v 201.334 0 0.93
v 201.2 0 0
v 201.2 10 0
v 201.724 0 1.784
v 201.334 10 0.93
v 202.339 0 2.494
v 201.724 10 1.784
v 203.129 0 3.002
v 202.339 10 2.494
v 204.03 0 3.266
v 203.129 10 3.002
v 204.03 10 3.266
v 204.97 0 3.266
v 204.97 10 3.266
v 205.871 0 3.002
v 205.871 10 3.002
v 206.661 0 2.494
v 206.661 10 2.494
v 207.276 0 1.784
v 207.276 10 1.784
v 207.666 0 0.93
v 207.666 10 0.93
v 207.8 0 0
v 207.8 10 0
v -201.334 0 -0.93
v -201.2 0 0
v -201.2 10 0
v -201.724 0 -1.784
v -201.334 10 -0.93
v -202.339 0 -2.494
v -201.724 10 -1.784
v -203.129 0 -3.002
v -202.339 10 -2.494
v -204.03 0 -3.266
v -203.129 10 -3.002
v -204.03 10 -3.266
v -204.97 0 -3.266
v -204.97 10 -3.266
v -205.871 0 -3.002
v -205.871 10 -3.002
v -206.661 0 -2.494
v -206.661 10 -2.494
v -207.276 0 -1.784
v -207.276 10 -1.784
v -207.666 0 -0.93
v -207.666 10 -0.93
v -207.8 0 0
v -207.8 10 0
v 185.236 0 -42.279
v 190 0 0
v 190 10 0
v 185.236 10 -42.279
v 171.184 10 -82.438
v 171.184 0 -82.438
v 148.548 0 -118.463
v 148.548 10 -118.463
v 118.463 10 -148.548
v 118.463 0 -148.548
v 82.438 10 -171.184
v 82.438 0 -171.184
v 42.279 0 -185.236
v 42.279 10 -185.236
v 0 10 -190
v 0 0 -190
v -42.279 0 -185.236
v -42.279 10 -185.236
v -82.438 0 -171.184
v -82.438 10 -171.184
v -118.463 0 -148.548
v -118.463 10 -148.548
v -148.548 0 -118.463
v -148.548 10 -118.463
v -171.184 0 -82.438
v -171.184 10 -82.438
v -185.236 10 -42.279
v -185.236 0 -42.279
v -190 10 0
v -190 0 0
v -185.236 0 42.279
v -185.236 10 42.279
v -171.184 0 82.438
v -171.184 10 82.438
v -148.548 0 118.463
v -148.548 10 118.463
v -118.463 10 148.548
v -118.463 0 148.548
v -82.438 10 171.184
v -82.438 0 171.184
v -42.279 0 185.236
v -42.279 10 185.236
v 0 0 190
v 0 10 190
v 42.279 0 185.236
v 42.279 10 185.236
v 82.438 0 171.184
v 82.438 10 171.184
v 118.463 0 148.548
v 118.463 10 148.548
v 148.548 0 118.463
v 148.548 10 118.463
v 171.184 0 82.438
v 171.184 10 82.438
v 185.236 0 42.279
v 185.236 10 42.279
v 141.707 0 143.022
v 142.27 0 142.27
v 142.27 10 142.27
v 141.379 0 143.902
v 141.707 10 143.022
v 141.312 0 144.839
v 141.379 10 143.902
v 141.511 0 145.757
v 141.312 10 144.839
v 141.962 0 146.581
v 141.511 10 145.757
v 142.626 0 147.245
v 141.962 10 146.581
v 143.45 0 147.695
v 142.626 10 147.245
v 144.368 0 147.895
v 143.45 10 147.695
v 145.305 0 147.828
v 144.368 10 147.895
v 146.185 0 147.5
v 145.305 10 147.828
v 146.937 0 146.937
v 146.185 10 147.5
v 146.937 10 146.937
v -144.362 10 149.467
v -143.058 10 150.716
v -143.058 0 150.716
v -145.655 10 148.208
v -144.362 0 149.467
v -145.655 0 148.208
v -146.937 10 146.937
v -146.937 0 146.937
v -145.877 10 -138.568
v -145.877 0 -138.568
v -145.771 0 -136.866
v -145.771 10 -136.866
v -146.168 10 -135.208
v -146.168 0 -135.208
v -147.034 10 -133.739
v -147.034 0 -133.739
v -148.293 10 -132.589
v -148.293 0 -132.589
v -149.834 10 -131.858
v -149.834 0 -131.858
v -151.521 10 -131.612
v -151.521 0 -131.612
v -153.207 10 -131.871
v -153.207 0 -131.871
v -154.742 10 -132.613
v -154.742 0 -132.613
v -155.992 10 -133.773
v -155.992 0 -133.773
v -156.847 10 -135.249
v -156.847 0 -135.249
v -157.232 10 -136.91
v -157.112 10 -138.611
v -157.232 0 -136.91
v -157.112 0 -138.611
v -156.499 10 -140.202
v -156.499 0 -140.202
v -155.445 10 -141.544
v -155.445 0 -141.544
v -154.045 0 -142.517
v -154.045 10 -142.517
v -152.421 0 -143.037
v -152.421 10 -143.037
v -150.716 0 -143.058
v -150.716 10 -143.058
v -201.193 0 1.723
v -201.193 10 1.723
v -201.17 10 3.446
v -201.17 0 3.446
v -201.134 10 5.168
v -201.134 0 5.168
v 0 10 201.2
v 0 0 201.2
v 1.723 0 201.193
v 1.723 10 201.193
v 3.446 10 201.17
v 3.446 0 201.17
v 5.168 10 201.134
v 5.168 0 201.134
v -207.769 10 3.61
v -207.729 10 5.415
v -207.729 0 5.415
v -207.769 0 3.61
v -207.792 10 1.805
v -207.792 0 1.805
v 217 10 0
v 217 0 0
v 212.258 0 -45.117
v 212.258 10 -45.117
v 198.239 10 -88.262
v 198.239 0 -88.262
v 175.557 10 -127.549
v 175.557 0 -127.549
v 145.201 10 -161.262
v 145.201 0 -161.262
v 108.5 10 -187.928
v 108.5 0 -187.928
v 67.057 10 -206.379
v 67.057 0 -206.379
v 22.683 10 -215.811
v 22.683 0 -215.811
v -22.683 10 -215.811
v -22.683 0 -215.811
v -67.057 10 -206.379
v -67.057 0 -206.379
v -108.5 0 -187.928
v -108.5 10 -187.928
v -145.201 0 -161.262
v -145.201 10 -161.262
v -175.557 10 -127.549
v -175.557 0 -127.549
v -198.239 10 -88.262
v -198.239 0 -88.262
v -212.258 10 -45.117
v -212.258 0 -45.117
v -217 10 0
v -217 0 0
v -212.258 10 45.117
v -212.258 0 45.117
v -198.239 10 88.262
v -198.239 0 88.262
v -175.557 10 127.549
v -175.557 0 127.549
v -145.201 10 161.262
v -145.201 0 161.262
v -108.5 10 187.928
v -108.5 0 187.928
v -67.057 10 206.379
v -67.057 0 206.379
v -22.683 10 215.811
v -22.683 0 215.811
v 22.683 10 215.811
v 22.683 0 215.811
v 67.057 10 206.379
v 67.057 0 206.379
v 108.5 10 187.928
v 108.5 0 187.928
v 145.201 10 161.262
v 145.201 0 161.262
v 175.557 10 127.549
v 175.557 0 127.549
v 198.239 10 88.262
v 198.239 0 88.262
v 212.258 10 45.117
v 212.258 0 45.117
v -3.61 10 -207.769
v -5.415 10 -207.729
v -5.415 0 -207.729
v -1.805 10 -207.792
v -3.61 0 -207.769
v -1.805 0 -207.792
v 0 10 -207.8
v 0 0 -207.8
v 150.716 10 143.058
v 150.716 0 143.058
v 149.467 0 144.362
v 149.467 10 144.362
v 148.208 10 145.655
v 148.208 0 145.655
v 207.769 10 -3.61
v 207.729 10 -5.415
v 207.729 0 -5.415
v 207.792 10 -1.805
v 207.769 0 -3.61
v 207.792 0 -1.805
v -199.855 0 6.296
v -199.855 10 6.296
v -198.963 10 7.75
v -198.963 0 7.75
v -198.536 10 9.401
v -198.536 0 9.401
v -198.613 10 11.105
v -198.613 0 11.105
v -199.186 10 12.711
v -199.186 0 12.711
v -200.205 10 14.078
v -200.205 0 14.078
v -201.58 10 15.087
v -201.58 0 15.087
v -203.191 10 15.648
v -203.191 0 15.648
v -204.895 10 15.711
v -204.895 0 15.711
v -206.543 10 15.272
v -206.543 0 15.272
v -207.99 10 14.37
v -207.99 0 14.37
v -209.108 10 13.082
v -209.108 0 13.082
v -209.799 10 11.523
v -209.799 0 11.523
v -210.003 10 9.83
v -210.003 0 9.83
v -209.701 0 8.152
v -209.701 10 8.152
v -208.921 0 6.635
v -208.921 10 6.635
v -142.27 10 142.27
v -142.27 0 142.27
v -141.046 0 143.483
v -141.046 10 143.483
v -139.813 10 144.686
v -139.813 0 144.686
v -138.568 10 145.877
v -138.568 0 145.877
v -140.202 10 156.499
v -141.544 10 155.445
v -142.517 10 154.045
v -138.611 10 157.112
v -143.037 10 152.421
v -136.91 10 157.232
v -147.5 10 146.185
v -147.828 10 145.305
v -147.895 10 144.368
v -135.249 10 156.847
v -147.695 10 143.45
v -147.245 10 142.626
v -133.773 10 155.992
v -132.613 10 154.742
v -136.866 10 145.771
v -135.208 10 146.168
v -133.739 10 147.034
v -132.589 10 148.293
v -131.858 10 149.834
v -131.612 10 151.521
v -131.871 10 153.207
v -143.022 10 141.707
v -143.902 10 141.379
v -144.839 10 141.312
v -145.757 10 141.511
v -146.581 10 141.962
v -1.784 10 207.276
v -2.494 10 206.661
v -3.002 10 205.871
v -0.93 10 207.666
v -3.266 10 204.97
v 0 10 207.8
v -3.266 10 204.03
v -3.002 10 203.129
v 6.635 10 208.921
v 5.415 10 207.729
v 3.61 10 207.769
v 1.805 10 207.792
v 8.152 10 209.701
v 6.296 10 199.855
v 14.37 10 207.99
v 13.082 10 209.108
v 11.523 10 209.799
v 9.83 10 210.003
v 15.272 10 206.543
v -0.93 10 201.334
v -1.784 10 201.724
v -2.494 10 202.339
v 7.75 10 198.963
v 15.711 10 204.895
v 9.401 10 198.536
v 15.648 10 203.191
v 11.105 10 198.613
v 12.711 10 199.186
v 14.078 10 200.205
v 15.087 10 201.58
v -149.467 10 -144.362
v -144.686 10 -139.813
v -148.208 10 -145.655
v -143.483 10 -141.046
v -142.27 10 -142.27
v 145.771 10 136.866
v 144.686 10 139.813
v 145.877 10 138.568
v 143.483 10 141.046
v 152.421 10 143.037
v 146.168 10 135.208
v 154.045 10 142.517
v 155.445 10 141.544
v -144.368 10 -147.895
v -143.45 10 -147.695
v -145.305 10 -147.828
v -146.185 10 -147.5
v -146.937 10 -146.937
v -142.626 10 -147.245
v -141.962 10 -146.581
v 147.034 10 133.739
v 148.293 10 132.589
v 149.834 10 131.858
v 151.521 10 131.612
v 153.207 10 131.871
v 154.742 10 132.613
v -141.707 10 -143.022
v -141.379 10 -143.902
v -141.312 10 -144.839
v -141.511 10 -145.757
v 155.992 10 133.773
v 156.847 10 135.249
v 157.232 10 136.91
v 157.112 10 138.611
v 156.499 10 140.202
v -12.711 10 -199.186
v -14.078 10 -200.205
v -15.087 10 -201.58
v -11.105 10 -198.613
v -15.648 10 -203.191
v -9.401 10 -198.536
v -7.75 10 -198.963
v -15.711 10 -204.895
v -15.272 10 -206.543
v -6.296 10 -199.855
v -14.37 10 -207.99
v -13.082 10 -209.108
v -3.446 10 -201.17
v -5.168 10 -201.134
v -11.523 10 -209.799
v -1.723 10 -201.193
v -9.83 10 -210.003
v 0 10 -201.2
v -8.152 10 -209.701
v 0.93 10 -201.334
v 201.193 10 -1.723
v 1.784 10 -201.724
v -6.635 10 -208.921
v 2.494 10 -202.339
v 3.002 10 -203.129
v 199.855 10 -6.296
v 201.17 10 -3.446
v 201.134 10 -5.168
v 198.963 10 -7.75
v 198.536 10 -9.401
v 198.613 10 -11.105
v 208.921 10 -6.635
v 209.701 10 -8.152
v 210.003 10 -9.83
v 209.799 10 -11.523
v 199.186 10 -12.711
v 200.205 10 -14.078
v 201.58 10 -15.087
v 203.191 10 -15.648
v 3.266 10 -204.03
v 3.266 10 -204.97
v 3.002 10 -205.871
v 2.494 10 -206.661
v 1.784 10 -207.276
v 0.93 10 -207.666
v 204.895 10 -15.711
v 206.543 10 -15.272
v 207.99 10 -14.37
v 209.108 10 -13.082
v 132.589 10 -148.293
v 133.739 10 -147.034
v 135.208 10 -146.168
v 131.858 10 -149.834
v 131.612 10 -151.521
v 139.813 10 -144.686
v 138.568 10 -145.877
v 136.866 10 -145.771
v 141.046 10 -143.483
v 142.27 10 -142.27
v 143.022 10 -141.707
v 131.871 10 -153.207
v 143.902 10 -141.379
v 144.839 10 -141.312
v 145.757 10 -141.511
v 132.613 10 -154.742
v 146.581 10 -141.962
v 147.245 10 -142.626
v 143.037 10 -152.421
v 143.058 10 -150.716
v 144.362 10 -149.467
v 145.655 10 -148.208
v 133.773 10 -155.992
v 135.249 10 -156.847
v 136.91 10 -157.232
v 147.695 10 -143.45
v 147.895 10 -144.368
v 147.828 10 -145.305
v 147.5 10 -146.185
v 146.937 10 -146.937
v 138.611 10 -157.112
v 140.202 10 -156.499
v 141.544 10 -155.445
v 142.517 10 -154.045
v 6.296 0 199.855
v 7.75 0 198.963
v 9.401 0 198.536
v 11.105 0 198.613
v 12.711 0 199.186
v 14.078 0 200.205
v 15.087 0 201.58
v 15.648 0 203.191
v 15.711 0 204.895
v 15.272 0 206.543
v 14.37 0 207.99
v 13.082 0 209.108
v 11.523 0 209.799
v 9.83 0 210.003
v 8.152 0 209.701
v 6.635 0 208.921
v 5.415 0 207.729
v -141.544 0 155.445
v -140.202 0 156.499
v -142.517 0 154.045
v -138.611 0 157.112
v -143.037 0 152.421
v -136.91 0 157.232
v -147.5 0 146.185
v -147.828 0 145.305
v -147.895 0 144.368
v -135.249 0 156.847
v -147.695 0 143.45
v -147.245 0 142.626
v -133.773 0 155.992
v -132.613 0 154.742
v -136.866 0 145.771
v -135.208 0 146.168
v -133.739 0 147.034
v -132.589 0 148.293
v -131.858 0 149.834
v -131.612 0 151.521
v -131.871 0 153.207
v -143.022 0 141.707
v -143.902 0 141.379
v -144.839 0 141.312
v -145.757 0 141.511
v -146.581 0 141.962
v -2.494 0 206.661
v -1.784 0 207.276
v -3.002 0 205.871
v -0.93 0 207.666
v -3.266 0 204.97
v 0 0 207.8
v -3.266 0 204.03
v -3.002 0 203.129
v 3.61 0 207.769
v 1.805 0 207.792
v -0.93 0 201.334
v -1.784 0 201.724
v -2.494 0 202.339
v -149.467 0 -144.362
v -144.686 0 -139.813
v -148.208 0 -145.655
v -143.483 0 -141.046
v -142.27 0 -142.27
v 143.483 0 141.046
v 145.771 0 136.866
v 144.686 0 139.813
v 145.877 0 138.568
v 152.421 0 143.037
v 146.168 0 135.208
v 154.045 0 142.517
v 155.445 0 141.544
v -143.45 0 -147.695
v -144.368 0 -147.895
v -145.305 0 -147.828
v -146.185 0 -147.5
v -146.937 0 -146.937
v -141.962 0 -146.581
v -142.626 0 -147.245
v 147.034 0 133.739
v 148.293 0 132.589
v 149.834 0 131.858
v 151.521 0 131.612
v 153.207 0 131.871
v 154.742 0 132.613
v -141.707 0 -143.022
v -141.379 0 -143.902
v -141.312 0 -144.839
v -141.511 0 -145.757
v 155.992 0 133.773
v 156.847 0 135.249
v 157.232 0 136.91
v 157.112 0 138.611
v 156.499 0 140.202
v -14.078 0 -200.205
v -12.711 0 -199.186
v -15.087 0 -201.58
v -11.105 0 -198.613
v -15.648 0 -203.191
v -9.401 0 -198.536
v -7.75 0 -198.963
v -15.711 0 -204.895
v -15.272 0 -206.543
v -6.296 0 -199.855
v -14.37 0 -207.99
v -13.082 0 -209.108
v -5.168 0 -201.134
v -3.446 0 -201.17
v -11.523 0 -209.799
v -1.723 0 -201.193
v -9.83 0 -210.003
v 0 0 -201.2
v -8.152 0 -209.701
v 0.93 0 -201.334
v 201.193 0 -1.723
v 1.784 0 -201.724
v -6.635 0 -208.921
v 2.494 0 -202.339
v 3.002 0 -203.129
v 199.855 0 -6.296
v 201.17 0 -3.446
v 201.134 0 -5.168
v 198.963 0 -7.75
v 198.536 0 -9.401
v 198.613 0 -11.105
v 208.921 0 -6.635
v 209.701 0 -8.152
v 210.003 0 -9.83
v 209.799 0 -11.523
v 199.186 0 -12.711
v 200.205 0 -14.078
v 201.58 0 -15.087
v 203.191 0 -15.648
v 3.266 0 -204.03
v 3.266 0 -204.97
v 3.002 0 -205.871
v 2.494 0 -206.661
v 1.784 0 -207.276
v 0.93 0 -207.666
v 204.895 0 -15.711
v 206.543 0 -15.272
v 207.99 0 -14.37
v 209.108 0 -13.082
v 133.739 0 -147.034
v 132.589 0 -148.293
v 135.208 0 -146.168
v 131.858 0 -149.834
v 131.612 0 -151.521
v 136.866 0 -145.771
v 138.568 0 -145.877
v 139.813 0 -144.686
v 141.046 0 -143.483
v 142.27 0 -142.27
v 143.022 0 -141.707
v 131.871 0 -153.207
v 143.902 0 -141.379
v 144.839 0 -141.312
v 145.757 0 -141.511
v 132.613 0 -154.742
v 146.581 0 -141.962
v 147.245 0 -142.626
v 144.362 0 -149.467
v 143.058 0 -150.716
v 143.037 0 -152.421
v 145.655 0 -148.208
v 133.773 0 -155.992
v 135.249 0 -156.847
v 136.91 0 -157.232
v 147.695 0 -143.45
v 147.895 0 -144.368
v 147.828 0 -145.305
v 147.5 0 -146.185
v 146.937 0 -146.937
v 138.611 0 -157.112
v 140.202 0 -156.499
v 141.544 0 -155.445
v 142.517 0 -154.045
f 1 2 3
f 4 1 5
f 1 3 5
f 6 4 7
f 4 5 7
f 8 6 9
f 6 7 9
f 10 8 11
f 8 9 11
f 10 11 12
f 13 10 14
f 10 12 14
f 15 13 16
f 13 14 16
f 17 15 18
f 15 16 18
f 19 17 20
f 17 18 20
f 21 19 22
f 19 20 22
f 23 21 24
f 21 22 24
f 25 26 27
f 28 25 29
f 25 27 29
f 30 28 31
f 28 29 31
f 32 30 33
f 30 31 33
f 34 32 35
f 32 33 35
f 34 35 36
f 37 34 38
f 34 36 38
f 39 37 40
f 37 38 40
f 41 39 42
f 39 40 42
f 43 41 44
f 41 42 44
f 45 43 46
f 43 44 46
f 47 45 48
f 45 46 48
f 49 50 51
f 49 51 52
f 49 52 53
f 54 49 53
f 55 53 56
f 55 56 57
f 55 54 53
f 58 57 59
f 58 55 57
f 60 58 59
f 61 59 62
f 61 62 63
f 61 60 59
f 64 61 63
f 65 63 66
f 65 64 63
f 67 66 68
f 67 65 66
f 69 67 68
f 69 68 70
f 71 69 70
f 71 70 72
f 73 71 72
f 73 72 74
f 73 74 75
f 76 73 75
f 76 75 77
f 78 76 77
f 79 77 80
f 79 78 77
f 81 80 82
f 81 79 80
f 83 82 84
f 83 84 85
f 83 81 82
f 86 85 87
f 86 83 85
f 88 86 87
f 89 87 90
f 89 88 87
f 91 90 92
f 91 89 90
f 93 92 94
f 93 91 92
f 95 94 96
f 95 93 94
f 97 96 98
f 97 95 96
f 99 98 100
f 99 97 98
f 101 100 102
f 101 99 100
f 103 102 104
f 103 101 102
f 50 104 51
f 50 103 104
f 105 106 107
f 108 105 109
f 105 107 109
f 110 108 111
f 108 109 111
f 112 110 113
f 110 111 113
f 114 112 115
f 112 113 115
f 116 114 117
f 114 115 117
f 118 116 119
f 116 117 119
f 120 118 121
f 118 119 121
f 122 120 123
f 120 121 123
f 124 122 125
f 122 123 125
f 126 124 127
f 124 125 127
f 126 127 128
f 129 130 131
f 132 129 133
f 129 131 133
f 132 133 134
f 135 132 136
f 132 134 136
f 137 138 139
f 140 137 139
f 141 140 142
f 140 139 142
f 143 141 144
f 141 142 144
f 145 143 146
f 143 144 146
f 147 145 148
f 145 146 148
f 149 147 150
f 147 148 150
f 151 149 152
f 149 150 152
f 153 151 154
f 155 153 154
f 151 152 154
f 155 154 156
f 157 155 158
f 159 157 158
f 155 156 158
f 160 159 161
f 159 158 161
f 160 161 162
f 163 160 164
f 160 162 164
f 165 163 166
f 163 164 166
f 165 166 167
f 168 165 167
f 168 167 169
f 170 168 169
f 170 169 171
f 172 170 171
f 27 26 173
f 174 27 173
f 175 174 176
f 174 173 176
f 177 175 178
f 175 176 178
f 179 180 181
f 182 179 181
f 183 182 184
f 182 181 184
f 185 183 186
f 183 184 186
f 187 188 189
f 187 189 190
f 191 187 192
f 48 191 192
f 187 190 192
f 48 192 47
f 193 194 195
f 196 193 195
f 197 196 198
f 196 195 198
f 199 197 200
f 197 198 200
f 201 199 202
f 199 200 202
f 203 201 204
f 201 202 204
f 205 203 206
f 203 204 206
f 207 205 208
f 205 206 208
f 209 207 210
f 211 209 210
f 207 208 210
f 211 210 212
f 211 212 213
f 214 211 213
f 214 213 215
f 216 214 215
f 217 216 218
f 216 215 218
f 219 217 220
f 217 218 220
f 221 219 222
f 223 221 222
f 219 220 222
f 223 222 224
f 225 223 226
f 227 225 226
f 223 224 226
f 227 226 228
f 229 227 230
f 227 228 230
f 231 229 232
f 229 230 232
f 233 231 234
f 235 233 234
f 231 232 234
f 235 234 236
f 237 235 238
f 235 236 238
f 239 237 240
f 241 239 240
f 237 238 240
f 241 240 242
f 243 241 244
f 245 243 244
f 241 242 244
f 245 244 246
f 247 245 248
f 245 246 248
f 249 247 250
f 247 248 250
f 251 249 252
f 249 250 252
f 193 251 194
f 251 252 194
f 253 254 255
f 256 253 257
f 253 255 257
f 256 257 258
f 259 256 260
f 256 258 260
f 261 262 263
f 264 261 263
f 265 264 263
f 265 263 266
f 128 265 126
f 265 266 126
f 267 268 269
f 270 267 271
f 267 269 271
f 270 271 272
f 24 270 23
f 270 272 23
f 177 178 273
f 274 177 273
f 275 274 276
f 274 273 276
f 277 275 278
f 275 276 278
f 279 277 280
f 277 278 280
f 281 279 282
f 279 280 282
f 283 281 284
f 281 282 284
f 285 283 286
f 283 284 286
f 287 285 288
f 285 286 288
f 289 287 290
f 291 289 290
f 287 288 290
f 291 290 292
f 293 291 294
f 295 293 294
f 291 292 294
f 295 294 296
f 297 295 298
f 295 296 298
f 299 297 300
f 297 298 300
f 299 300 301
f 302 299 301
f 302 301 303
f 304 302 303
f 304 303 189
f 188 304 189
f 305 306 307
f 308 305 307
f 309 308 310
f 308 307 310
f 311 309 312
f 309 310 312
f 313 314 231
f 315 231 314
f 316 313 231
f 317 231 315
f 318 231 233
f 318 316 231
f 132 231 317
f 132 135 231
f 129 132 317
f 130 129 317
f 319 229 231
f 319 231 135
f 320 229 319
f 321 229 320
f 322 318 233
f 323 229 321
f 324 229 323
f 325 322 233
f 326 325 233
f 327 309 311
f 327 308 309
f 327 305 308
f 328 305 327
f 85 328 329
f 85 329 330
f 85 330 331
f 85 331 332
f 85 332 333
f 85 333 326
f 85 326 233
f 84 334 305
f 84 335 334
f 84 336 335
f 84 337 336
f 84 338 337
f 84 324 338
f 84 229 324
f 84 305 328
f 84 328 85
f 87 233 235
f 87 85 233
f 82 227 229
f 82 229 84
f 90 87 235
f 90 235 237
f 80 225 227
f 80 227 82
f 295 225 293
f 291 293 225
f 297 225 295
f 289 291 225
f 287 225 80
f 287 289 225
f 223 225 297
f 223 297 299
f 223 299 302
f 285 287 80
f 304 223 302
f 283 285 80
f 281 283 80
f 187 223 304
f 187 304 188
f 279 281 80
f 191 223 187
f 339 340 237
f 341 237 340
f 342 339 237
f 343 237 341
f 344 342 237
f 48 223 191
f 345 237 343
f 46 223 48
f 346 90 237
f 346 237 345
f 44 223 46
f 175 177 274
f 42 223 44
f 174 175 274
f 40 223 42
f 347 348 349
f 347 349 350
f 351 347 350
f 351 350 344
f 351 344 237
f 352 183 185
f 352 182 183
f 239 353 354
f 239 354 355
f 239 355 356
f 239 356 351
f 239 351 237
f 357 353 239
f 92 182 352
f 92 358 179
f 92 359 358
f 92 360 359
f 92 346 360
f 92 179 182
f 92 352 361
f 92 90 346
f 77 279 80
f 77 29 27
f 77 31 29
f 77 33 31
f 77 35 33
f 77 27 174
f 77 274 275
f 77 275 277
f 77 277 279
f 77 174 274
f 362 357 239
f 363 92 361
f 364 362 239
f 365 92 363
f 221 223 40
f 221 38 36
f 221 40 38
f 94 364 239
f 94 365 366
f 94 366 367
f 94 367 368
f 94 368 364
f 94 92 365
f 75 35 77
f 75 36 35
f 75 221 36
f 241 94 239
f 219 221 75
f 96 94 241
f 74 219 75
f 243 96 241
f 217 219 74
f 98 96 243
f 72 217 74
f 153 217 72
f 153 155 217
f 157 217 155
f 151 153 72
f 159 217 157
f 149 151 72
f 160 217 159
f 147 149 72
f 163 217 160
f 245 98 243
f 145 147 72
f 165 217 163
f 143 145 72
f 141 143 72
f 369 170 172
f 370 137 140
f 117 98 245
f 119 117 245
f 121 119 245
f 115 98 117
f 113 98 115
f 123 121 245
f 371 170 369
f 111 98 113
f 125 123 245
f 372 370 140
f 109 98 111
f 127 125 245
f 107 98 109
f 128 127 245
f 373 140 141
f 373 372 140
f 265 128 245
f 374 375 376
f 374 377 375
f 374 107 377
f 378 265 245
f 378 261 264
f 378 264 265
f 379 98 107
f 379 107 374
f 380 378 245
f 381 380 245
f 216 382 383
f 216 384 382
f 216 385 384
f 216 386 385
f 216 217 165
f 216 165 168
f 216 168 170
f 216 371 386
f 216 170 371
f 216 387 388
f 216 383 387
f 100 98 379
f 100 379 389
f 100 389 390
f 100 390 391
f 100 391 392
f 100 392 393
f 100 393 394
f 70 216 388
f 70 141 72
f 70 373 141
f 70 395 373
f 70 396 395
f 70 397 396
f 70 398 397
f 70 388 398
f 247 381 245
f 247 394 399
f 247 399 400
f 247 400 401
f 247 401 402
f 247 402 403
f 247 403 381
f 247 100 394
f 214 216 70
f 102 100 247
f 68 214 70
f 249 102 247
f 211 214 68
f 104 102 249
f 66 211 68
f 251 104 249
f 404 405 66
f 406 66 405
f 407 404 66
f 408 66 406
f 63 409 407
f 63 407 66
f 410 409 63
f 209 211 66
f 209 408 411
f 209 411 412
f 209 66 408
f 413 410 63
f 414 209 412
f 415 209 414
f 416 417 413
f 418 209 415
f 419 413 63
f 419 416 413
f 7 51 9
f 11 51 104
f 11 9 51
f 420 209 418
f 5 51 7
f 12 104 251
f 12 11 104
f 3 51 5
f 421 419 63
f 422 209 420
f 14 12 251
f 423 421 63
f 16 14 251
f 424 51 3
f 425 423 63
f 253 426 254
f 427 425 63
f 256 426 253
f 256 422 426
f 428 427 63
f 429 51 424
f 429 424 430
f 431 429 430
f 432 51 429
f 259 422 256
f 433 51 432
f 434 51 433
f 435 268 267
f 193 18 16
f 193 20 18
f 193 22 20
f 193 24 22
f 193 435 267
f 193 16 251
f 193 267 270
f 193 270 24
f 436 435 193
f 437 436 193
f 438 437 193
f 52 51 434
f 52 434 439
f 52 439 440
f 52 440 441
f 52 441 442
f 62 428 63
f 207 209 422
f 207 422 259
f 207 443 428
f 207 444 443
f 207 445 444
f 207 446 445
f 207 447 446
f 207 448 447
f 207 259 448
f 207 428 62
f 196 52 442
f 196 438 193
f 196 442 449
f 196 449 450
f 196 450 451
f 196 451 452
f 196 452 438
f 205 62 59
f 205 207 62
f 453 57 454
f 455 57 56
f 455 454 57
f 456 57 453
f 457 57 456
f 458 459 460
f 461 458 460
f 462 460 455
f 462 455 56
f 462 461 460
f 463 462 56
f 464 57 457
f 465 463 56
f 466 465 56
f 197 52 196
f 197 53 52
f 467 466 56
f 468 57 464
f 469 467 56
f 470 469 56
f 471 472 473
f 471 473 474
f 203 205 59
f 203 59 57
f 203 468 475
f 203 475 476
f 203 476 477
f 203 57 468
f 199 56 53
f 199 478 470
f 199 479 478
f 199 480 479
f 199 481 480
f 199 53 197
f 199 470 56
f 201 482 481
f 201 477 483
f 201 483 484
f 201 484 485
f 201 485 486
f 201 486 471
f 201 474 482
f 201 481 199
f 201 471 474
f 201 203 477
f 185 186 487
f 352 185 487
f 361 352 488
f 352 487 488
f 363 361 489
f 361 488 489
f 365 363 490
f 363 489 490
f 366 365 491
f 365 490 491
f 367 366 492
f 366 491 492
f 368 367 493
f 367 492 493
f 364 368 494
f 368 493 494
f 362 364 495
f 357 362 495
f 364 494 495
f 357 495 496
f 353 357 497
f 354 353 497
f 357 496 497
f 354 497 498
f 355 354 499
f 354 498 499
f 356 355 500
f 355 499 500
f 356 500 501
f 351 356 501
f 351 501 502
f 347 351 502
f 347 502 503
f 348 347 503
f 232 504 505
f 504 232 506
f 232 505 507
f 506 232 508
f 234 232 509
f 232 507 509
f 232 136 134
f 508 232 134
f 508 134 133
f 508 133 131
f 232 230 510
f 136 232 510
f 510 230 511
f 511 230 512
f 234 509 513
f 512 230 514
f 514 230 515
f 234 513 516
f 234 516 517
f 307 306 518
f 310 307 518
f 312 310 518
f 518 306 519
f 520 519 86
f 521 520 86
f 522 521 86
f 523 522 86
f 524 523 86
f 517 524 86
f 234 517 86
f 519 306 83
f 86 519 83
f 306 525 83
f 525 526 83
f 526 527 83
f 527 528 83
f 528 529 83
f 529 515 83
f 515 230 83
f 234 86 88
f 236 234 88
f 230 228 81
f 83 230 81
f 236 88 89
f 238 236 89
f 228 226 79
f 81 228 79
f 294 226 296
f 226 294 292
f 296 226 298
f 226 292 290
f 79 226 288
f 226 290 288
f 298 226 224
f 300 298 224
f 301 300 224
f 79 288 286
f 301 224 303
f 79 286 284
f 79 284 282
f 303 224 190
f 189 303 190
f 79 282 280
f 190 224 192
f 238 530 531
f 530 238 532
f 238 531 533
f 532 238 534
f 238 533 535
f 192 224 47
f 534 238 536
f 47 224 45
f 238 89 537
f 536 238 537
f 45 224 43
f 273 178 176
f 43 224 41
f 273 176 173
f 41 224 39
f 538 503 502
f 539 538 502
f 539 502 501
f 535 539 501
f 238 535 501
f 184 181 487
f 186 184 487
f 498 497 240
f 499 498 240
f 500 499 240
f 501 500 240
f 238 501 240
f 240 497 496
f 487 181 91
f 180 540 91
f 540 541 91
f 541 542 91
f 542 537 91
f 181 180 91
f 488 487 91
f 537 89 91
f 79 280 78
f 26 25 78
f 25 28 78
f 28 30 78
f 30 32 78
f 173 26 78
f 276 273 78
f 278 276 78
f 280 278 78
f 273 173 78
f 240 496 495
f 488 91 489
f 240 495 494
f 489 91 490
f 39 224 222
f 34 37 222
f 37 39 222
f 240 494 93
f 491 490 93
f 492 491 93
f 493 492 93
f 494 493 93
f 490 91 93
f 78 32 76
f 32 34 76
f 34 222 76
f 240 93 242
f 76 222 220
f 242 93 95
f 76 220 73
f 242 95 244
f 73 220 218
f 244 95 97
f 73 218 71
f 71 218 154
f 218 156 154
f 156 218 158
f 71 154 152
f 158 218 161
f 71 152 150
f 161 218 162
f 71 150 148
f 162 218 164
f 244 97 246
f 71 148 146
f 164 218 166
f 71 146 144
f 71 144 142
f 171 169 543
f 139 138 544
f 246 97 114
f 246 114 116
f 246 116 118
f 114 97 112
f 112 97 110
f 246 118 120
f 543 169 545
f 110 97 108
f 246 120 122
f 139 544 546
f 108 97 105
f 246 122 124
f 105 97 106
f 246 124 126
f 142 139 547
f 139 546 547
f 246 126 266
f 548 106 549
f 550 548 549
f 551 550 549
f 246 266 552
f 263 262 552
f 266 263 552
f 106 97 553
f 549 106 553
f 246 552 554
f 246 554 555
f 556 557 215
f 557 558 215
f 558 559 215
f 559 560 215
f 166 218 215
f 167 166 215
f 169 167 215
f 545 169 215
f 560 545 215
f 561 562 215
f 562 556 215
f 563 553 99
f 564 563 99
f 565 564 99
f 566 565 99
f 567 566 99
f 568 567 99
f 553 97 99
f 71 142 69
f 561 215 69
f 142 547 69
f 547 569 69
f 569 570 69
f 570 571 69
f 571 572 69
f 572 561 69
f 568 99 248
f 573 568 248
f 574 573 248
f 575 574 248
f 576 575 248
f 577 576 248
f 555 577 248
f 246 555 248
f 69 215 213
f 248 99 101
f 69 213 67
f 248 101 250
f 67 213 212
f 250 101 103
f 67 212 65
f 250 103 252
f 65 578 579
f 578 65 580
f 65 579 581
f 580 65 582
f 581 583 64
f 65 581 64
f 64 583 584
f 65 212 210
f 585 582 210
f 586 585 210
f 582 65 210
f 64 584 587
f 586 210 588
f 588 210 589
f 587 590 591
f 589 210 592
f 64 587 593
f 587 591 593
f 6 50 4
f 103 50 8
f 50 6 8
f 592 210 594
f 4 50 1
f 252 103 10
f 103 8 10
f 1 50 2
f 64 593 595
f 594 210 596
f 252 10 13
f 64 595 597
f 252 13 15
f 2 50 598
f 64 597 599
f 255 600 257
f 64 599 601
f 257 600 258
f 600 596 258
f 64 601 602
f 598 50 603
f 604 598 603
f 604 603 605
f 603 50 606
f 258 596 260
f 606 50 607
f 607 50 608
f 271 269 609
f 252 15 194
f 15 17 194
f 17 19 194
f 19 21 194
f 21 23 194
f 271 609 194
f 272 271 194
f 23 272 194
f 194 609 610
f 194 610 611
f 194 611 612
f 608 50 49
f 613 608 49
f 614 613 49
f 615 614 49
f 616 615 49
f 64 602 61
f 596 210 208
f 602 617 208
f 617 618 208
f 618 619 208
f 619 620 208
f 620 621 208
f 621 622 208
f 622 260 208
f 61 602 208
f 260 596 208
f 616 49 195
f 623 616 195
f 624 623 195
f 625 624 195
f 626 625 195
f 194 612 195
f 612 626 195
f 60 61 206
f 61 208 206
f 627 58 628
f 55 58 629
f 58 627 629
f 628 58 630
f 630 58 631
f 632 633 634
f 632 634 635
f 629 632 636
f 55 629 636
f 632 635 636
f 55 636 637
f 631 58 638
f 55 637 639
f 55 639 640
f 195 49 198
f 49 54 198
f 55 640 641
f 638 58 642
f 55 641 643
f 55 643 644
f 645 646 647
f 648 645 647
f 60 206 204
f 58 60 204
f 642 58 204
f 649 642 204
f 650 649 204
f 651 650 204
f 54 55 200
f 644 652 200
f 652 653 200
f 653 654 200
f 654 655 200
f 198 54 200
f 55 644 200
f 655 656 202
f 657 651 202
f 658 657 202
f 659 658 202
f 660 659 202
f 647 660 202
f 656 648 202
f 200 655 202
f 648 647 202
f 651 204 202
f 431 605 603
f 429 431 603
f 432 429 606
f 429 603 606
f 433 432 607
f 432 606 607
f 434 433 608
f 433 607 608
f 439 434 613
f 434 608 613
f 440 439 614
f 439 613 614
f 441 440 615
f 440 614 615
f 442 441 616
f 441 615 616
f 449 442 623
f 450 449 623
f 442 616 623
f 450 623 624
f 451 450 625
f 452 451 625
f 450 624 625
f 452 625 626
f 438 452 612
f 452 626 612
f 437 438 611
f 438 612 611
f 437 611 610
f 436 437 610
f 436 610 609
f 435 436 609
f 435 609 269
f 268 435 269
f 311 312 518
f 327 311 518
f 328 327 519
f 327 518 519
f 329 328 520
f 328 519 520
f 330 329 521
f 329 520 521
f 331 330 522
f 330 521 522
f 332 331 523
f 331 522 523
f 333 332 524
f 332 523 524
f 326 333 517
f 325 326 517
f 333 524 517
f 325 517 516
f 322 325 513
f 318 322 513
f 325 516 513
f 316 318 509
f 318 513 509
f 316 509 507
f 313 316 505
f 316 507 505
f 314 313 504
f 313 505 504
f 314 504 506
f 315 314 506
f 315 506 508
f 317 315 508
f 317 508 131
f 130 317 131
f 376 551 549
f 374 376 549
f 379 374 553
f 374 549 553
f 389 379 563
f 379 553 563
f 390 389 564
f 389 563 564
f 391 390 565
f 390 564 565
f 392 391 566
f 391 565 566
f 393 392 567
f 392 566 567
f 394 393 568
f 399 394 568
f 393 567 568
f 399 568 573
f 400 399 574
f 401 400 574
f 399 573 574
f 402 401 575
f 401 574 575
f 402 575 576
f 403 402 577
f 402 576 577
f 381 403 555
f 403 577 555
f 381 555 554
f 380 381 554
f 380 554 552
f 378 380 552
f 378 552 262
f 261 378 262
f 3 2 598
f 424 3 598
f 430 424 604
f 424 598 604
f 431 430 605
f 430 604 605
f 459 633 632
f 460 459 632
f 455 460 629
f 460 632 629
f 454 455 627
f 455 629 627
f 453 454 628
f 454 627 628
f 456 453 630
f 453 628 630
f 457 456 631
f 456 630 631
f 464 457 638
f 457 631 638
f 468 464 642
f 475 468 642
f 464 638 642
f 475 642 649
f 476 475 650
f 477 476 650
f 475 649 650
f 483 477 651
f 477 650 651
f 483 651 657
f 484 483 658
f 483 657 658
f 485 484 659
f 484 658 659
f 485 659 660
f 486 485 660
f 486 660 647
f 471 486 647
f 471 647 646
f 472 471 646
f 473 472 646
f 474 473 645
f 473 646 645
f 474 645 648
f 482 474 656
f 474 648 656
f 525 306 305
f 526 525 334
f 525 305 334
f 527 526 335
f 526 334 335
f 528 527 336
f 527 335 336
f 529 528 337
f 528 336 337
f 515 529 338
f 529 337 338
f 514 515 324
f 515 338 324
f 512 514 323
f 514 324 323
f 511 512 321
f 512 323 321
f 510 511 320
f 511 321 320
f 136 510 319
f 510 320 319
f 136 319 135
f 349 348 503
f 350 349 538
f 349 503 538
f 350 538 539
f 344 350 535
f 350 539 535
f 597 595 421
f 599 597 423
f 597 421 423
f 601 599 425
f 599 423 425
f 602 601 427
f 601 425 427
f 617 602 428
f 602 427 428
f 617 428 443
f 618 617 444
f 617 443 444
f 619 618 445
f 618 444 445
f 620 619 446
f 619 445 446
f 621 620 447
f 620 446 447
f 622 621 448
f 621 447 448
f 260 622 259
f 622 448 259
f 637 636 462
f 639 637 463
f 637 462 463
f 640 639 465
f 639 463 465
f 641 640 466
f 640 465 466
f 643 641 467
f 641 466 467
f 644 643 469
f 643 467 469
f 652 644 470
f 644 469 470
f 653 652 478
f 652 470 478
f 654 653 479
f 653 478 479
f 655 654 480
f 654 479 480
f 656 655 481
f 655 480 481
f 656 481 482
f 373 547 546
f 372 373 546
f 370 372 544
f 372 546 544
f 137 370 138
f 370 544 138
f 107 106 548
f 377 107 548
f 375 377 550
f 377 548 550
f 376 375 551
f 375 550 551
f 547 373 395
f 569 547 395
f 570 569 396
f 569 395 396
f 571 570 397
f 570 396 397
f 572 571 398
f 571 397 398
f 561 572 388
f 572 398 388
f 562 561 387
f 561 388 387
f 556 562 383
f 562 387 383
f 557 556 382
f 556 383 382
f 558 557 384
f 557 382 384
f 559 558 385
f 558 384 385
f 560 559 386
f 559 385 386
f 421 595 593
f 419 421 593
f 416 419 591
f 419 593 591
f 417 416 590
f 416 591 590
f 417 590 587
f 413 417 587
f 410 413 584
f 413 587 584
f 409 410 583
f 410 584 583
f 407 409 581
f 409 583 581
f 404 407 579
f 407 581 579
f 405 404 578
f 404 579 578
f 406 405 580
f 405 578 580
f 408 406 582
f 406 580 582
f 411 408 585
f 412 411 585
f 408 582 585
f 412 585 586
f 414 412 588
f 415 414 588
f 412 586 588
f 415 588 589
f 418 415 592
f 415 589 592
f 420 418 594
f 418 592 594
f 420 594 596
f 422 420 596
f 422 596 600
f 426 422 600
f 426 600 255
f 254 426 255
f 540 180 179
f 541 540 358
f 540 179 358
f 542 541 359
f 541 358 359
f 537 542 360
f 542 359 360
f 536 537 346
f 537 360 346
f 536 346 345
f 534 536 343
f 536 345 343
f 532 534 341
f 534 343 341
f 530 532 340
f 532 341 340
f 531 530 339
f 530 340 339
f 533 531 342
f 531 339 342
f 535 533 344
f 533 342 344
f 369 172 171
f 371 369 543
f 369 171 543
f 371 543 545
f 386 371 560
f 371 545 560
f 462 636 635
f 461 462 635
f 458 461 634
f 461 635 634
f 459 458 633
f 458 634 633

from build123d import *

# Parameters (mm, degrees)
SKETCH1_R            = 217
SKETCH1_R_2          = 190
MAINRING_DEPTH       = 10
M6_CLEARANCE_HOLE1_D = 6.6
HOLEPATTERN_COUNT    = 8
CUT_EXTRUDE1_DEPTH   = 11
CIRPATTERN1_COUNT    = 8


with BuildPart() as part:
    # Sketch1 → MainRing (new body)
    with BuildSketch(Plane(origin=(0, 0, 0), x_dir=(1, 0, 0), z_dir=(0, 1, 0))):
        Circle(SKETCH1_R)
        Circle(SKETCH1_R_2, mode=Mode.SUBTRACT)
    extrude(amount=MAINRING_DEPTH)

    # M6 Clearance Hole1 (through all)
    with Locations(Plane(origin=(0, 0, 0), x_dir=(-1, 0, 0), z_dir=(0, -1, 0))):
        with Locations((0, -204.5)):
            m6_clearance_hole1 = Hole(M6_CLEARANCE_HOLE1_D / 2)

    # HolePattern: M6 Clearance Hole1 ×8 about axis
    holepattern_axis = Axis((0, 0, 0), (0, 1, 0))
    for i in range(1, HOLEPATTERN_COUNT):
        add(m6_clearance_hole1.rotate(holepattern_axis, i * 360 / HOLEPATTERN_COUNT), mode=Mode.SUBTRACT)

    # Sketch5 → Cut-Extrude1 (cut, through all)
    with BuildSketch(Plane.XZ):
        with BuildLine():
            ThreePointArc((201.13360859, -5.168316504), (204.040552386, -15.742991514), (207.729432581, -5.415056739))
            ThreePointArc((207.729432581, -5.415056739), (207.782357396, -2.707758263), (207.8, 0))
            ThreePointArc((207.8, 0), (204.5, -3.3), (201.2, 0))
            ThreePointArc((201.2, 0), (201.183401463, -2.584371456), (201.13360859, -5.168316504))
        make_face()
    cut_extrude1 = extrude(amount=-CUT_EXTRUDE1_DEPTH, mode=Mode.SUBTRACT)

    # CirPattern1: Cut-Extrude1 ×8 about axis
    cirpattern1_axis = Axis((0, 0, 0), (0, 1, 0))
    for i in range(1, CIRPATTERN1_COUNT):
        add(cut_extrude1.rotate(cirpattern1_axis, i * 360 / CIRPATTERN1_COUNT), mode=Mode.SUBTRACT)


solid = part.part
